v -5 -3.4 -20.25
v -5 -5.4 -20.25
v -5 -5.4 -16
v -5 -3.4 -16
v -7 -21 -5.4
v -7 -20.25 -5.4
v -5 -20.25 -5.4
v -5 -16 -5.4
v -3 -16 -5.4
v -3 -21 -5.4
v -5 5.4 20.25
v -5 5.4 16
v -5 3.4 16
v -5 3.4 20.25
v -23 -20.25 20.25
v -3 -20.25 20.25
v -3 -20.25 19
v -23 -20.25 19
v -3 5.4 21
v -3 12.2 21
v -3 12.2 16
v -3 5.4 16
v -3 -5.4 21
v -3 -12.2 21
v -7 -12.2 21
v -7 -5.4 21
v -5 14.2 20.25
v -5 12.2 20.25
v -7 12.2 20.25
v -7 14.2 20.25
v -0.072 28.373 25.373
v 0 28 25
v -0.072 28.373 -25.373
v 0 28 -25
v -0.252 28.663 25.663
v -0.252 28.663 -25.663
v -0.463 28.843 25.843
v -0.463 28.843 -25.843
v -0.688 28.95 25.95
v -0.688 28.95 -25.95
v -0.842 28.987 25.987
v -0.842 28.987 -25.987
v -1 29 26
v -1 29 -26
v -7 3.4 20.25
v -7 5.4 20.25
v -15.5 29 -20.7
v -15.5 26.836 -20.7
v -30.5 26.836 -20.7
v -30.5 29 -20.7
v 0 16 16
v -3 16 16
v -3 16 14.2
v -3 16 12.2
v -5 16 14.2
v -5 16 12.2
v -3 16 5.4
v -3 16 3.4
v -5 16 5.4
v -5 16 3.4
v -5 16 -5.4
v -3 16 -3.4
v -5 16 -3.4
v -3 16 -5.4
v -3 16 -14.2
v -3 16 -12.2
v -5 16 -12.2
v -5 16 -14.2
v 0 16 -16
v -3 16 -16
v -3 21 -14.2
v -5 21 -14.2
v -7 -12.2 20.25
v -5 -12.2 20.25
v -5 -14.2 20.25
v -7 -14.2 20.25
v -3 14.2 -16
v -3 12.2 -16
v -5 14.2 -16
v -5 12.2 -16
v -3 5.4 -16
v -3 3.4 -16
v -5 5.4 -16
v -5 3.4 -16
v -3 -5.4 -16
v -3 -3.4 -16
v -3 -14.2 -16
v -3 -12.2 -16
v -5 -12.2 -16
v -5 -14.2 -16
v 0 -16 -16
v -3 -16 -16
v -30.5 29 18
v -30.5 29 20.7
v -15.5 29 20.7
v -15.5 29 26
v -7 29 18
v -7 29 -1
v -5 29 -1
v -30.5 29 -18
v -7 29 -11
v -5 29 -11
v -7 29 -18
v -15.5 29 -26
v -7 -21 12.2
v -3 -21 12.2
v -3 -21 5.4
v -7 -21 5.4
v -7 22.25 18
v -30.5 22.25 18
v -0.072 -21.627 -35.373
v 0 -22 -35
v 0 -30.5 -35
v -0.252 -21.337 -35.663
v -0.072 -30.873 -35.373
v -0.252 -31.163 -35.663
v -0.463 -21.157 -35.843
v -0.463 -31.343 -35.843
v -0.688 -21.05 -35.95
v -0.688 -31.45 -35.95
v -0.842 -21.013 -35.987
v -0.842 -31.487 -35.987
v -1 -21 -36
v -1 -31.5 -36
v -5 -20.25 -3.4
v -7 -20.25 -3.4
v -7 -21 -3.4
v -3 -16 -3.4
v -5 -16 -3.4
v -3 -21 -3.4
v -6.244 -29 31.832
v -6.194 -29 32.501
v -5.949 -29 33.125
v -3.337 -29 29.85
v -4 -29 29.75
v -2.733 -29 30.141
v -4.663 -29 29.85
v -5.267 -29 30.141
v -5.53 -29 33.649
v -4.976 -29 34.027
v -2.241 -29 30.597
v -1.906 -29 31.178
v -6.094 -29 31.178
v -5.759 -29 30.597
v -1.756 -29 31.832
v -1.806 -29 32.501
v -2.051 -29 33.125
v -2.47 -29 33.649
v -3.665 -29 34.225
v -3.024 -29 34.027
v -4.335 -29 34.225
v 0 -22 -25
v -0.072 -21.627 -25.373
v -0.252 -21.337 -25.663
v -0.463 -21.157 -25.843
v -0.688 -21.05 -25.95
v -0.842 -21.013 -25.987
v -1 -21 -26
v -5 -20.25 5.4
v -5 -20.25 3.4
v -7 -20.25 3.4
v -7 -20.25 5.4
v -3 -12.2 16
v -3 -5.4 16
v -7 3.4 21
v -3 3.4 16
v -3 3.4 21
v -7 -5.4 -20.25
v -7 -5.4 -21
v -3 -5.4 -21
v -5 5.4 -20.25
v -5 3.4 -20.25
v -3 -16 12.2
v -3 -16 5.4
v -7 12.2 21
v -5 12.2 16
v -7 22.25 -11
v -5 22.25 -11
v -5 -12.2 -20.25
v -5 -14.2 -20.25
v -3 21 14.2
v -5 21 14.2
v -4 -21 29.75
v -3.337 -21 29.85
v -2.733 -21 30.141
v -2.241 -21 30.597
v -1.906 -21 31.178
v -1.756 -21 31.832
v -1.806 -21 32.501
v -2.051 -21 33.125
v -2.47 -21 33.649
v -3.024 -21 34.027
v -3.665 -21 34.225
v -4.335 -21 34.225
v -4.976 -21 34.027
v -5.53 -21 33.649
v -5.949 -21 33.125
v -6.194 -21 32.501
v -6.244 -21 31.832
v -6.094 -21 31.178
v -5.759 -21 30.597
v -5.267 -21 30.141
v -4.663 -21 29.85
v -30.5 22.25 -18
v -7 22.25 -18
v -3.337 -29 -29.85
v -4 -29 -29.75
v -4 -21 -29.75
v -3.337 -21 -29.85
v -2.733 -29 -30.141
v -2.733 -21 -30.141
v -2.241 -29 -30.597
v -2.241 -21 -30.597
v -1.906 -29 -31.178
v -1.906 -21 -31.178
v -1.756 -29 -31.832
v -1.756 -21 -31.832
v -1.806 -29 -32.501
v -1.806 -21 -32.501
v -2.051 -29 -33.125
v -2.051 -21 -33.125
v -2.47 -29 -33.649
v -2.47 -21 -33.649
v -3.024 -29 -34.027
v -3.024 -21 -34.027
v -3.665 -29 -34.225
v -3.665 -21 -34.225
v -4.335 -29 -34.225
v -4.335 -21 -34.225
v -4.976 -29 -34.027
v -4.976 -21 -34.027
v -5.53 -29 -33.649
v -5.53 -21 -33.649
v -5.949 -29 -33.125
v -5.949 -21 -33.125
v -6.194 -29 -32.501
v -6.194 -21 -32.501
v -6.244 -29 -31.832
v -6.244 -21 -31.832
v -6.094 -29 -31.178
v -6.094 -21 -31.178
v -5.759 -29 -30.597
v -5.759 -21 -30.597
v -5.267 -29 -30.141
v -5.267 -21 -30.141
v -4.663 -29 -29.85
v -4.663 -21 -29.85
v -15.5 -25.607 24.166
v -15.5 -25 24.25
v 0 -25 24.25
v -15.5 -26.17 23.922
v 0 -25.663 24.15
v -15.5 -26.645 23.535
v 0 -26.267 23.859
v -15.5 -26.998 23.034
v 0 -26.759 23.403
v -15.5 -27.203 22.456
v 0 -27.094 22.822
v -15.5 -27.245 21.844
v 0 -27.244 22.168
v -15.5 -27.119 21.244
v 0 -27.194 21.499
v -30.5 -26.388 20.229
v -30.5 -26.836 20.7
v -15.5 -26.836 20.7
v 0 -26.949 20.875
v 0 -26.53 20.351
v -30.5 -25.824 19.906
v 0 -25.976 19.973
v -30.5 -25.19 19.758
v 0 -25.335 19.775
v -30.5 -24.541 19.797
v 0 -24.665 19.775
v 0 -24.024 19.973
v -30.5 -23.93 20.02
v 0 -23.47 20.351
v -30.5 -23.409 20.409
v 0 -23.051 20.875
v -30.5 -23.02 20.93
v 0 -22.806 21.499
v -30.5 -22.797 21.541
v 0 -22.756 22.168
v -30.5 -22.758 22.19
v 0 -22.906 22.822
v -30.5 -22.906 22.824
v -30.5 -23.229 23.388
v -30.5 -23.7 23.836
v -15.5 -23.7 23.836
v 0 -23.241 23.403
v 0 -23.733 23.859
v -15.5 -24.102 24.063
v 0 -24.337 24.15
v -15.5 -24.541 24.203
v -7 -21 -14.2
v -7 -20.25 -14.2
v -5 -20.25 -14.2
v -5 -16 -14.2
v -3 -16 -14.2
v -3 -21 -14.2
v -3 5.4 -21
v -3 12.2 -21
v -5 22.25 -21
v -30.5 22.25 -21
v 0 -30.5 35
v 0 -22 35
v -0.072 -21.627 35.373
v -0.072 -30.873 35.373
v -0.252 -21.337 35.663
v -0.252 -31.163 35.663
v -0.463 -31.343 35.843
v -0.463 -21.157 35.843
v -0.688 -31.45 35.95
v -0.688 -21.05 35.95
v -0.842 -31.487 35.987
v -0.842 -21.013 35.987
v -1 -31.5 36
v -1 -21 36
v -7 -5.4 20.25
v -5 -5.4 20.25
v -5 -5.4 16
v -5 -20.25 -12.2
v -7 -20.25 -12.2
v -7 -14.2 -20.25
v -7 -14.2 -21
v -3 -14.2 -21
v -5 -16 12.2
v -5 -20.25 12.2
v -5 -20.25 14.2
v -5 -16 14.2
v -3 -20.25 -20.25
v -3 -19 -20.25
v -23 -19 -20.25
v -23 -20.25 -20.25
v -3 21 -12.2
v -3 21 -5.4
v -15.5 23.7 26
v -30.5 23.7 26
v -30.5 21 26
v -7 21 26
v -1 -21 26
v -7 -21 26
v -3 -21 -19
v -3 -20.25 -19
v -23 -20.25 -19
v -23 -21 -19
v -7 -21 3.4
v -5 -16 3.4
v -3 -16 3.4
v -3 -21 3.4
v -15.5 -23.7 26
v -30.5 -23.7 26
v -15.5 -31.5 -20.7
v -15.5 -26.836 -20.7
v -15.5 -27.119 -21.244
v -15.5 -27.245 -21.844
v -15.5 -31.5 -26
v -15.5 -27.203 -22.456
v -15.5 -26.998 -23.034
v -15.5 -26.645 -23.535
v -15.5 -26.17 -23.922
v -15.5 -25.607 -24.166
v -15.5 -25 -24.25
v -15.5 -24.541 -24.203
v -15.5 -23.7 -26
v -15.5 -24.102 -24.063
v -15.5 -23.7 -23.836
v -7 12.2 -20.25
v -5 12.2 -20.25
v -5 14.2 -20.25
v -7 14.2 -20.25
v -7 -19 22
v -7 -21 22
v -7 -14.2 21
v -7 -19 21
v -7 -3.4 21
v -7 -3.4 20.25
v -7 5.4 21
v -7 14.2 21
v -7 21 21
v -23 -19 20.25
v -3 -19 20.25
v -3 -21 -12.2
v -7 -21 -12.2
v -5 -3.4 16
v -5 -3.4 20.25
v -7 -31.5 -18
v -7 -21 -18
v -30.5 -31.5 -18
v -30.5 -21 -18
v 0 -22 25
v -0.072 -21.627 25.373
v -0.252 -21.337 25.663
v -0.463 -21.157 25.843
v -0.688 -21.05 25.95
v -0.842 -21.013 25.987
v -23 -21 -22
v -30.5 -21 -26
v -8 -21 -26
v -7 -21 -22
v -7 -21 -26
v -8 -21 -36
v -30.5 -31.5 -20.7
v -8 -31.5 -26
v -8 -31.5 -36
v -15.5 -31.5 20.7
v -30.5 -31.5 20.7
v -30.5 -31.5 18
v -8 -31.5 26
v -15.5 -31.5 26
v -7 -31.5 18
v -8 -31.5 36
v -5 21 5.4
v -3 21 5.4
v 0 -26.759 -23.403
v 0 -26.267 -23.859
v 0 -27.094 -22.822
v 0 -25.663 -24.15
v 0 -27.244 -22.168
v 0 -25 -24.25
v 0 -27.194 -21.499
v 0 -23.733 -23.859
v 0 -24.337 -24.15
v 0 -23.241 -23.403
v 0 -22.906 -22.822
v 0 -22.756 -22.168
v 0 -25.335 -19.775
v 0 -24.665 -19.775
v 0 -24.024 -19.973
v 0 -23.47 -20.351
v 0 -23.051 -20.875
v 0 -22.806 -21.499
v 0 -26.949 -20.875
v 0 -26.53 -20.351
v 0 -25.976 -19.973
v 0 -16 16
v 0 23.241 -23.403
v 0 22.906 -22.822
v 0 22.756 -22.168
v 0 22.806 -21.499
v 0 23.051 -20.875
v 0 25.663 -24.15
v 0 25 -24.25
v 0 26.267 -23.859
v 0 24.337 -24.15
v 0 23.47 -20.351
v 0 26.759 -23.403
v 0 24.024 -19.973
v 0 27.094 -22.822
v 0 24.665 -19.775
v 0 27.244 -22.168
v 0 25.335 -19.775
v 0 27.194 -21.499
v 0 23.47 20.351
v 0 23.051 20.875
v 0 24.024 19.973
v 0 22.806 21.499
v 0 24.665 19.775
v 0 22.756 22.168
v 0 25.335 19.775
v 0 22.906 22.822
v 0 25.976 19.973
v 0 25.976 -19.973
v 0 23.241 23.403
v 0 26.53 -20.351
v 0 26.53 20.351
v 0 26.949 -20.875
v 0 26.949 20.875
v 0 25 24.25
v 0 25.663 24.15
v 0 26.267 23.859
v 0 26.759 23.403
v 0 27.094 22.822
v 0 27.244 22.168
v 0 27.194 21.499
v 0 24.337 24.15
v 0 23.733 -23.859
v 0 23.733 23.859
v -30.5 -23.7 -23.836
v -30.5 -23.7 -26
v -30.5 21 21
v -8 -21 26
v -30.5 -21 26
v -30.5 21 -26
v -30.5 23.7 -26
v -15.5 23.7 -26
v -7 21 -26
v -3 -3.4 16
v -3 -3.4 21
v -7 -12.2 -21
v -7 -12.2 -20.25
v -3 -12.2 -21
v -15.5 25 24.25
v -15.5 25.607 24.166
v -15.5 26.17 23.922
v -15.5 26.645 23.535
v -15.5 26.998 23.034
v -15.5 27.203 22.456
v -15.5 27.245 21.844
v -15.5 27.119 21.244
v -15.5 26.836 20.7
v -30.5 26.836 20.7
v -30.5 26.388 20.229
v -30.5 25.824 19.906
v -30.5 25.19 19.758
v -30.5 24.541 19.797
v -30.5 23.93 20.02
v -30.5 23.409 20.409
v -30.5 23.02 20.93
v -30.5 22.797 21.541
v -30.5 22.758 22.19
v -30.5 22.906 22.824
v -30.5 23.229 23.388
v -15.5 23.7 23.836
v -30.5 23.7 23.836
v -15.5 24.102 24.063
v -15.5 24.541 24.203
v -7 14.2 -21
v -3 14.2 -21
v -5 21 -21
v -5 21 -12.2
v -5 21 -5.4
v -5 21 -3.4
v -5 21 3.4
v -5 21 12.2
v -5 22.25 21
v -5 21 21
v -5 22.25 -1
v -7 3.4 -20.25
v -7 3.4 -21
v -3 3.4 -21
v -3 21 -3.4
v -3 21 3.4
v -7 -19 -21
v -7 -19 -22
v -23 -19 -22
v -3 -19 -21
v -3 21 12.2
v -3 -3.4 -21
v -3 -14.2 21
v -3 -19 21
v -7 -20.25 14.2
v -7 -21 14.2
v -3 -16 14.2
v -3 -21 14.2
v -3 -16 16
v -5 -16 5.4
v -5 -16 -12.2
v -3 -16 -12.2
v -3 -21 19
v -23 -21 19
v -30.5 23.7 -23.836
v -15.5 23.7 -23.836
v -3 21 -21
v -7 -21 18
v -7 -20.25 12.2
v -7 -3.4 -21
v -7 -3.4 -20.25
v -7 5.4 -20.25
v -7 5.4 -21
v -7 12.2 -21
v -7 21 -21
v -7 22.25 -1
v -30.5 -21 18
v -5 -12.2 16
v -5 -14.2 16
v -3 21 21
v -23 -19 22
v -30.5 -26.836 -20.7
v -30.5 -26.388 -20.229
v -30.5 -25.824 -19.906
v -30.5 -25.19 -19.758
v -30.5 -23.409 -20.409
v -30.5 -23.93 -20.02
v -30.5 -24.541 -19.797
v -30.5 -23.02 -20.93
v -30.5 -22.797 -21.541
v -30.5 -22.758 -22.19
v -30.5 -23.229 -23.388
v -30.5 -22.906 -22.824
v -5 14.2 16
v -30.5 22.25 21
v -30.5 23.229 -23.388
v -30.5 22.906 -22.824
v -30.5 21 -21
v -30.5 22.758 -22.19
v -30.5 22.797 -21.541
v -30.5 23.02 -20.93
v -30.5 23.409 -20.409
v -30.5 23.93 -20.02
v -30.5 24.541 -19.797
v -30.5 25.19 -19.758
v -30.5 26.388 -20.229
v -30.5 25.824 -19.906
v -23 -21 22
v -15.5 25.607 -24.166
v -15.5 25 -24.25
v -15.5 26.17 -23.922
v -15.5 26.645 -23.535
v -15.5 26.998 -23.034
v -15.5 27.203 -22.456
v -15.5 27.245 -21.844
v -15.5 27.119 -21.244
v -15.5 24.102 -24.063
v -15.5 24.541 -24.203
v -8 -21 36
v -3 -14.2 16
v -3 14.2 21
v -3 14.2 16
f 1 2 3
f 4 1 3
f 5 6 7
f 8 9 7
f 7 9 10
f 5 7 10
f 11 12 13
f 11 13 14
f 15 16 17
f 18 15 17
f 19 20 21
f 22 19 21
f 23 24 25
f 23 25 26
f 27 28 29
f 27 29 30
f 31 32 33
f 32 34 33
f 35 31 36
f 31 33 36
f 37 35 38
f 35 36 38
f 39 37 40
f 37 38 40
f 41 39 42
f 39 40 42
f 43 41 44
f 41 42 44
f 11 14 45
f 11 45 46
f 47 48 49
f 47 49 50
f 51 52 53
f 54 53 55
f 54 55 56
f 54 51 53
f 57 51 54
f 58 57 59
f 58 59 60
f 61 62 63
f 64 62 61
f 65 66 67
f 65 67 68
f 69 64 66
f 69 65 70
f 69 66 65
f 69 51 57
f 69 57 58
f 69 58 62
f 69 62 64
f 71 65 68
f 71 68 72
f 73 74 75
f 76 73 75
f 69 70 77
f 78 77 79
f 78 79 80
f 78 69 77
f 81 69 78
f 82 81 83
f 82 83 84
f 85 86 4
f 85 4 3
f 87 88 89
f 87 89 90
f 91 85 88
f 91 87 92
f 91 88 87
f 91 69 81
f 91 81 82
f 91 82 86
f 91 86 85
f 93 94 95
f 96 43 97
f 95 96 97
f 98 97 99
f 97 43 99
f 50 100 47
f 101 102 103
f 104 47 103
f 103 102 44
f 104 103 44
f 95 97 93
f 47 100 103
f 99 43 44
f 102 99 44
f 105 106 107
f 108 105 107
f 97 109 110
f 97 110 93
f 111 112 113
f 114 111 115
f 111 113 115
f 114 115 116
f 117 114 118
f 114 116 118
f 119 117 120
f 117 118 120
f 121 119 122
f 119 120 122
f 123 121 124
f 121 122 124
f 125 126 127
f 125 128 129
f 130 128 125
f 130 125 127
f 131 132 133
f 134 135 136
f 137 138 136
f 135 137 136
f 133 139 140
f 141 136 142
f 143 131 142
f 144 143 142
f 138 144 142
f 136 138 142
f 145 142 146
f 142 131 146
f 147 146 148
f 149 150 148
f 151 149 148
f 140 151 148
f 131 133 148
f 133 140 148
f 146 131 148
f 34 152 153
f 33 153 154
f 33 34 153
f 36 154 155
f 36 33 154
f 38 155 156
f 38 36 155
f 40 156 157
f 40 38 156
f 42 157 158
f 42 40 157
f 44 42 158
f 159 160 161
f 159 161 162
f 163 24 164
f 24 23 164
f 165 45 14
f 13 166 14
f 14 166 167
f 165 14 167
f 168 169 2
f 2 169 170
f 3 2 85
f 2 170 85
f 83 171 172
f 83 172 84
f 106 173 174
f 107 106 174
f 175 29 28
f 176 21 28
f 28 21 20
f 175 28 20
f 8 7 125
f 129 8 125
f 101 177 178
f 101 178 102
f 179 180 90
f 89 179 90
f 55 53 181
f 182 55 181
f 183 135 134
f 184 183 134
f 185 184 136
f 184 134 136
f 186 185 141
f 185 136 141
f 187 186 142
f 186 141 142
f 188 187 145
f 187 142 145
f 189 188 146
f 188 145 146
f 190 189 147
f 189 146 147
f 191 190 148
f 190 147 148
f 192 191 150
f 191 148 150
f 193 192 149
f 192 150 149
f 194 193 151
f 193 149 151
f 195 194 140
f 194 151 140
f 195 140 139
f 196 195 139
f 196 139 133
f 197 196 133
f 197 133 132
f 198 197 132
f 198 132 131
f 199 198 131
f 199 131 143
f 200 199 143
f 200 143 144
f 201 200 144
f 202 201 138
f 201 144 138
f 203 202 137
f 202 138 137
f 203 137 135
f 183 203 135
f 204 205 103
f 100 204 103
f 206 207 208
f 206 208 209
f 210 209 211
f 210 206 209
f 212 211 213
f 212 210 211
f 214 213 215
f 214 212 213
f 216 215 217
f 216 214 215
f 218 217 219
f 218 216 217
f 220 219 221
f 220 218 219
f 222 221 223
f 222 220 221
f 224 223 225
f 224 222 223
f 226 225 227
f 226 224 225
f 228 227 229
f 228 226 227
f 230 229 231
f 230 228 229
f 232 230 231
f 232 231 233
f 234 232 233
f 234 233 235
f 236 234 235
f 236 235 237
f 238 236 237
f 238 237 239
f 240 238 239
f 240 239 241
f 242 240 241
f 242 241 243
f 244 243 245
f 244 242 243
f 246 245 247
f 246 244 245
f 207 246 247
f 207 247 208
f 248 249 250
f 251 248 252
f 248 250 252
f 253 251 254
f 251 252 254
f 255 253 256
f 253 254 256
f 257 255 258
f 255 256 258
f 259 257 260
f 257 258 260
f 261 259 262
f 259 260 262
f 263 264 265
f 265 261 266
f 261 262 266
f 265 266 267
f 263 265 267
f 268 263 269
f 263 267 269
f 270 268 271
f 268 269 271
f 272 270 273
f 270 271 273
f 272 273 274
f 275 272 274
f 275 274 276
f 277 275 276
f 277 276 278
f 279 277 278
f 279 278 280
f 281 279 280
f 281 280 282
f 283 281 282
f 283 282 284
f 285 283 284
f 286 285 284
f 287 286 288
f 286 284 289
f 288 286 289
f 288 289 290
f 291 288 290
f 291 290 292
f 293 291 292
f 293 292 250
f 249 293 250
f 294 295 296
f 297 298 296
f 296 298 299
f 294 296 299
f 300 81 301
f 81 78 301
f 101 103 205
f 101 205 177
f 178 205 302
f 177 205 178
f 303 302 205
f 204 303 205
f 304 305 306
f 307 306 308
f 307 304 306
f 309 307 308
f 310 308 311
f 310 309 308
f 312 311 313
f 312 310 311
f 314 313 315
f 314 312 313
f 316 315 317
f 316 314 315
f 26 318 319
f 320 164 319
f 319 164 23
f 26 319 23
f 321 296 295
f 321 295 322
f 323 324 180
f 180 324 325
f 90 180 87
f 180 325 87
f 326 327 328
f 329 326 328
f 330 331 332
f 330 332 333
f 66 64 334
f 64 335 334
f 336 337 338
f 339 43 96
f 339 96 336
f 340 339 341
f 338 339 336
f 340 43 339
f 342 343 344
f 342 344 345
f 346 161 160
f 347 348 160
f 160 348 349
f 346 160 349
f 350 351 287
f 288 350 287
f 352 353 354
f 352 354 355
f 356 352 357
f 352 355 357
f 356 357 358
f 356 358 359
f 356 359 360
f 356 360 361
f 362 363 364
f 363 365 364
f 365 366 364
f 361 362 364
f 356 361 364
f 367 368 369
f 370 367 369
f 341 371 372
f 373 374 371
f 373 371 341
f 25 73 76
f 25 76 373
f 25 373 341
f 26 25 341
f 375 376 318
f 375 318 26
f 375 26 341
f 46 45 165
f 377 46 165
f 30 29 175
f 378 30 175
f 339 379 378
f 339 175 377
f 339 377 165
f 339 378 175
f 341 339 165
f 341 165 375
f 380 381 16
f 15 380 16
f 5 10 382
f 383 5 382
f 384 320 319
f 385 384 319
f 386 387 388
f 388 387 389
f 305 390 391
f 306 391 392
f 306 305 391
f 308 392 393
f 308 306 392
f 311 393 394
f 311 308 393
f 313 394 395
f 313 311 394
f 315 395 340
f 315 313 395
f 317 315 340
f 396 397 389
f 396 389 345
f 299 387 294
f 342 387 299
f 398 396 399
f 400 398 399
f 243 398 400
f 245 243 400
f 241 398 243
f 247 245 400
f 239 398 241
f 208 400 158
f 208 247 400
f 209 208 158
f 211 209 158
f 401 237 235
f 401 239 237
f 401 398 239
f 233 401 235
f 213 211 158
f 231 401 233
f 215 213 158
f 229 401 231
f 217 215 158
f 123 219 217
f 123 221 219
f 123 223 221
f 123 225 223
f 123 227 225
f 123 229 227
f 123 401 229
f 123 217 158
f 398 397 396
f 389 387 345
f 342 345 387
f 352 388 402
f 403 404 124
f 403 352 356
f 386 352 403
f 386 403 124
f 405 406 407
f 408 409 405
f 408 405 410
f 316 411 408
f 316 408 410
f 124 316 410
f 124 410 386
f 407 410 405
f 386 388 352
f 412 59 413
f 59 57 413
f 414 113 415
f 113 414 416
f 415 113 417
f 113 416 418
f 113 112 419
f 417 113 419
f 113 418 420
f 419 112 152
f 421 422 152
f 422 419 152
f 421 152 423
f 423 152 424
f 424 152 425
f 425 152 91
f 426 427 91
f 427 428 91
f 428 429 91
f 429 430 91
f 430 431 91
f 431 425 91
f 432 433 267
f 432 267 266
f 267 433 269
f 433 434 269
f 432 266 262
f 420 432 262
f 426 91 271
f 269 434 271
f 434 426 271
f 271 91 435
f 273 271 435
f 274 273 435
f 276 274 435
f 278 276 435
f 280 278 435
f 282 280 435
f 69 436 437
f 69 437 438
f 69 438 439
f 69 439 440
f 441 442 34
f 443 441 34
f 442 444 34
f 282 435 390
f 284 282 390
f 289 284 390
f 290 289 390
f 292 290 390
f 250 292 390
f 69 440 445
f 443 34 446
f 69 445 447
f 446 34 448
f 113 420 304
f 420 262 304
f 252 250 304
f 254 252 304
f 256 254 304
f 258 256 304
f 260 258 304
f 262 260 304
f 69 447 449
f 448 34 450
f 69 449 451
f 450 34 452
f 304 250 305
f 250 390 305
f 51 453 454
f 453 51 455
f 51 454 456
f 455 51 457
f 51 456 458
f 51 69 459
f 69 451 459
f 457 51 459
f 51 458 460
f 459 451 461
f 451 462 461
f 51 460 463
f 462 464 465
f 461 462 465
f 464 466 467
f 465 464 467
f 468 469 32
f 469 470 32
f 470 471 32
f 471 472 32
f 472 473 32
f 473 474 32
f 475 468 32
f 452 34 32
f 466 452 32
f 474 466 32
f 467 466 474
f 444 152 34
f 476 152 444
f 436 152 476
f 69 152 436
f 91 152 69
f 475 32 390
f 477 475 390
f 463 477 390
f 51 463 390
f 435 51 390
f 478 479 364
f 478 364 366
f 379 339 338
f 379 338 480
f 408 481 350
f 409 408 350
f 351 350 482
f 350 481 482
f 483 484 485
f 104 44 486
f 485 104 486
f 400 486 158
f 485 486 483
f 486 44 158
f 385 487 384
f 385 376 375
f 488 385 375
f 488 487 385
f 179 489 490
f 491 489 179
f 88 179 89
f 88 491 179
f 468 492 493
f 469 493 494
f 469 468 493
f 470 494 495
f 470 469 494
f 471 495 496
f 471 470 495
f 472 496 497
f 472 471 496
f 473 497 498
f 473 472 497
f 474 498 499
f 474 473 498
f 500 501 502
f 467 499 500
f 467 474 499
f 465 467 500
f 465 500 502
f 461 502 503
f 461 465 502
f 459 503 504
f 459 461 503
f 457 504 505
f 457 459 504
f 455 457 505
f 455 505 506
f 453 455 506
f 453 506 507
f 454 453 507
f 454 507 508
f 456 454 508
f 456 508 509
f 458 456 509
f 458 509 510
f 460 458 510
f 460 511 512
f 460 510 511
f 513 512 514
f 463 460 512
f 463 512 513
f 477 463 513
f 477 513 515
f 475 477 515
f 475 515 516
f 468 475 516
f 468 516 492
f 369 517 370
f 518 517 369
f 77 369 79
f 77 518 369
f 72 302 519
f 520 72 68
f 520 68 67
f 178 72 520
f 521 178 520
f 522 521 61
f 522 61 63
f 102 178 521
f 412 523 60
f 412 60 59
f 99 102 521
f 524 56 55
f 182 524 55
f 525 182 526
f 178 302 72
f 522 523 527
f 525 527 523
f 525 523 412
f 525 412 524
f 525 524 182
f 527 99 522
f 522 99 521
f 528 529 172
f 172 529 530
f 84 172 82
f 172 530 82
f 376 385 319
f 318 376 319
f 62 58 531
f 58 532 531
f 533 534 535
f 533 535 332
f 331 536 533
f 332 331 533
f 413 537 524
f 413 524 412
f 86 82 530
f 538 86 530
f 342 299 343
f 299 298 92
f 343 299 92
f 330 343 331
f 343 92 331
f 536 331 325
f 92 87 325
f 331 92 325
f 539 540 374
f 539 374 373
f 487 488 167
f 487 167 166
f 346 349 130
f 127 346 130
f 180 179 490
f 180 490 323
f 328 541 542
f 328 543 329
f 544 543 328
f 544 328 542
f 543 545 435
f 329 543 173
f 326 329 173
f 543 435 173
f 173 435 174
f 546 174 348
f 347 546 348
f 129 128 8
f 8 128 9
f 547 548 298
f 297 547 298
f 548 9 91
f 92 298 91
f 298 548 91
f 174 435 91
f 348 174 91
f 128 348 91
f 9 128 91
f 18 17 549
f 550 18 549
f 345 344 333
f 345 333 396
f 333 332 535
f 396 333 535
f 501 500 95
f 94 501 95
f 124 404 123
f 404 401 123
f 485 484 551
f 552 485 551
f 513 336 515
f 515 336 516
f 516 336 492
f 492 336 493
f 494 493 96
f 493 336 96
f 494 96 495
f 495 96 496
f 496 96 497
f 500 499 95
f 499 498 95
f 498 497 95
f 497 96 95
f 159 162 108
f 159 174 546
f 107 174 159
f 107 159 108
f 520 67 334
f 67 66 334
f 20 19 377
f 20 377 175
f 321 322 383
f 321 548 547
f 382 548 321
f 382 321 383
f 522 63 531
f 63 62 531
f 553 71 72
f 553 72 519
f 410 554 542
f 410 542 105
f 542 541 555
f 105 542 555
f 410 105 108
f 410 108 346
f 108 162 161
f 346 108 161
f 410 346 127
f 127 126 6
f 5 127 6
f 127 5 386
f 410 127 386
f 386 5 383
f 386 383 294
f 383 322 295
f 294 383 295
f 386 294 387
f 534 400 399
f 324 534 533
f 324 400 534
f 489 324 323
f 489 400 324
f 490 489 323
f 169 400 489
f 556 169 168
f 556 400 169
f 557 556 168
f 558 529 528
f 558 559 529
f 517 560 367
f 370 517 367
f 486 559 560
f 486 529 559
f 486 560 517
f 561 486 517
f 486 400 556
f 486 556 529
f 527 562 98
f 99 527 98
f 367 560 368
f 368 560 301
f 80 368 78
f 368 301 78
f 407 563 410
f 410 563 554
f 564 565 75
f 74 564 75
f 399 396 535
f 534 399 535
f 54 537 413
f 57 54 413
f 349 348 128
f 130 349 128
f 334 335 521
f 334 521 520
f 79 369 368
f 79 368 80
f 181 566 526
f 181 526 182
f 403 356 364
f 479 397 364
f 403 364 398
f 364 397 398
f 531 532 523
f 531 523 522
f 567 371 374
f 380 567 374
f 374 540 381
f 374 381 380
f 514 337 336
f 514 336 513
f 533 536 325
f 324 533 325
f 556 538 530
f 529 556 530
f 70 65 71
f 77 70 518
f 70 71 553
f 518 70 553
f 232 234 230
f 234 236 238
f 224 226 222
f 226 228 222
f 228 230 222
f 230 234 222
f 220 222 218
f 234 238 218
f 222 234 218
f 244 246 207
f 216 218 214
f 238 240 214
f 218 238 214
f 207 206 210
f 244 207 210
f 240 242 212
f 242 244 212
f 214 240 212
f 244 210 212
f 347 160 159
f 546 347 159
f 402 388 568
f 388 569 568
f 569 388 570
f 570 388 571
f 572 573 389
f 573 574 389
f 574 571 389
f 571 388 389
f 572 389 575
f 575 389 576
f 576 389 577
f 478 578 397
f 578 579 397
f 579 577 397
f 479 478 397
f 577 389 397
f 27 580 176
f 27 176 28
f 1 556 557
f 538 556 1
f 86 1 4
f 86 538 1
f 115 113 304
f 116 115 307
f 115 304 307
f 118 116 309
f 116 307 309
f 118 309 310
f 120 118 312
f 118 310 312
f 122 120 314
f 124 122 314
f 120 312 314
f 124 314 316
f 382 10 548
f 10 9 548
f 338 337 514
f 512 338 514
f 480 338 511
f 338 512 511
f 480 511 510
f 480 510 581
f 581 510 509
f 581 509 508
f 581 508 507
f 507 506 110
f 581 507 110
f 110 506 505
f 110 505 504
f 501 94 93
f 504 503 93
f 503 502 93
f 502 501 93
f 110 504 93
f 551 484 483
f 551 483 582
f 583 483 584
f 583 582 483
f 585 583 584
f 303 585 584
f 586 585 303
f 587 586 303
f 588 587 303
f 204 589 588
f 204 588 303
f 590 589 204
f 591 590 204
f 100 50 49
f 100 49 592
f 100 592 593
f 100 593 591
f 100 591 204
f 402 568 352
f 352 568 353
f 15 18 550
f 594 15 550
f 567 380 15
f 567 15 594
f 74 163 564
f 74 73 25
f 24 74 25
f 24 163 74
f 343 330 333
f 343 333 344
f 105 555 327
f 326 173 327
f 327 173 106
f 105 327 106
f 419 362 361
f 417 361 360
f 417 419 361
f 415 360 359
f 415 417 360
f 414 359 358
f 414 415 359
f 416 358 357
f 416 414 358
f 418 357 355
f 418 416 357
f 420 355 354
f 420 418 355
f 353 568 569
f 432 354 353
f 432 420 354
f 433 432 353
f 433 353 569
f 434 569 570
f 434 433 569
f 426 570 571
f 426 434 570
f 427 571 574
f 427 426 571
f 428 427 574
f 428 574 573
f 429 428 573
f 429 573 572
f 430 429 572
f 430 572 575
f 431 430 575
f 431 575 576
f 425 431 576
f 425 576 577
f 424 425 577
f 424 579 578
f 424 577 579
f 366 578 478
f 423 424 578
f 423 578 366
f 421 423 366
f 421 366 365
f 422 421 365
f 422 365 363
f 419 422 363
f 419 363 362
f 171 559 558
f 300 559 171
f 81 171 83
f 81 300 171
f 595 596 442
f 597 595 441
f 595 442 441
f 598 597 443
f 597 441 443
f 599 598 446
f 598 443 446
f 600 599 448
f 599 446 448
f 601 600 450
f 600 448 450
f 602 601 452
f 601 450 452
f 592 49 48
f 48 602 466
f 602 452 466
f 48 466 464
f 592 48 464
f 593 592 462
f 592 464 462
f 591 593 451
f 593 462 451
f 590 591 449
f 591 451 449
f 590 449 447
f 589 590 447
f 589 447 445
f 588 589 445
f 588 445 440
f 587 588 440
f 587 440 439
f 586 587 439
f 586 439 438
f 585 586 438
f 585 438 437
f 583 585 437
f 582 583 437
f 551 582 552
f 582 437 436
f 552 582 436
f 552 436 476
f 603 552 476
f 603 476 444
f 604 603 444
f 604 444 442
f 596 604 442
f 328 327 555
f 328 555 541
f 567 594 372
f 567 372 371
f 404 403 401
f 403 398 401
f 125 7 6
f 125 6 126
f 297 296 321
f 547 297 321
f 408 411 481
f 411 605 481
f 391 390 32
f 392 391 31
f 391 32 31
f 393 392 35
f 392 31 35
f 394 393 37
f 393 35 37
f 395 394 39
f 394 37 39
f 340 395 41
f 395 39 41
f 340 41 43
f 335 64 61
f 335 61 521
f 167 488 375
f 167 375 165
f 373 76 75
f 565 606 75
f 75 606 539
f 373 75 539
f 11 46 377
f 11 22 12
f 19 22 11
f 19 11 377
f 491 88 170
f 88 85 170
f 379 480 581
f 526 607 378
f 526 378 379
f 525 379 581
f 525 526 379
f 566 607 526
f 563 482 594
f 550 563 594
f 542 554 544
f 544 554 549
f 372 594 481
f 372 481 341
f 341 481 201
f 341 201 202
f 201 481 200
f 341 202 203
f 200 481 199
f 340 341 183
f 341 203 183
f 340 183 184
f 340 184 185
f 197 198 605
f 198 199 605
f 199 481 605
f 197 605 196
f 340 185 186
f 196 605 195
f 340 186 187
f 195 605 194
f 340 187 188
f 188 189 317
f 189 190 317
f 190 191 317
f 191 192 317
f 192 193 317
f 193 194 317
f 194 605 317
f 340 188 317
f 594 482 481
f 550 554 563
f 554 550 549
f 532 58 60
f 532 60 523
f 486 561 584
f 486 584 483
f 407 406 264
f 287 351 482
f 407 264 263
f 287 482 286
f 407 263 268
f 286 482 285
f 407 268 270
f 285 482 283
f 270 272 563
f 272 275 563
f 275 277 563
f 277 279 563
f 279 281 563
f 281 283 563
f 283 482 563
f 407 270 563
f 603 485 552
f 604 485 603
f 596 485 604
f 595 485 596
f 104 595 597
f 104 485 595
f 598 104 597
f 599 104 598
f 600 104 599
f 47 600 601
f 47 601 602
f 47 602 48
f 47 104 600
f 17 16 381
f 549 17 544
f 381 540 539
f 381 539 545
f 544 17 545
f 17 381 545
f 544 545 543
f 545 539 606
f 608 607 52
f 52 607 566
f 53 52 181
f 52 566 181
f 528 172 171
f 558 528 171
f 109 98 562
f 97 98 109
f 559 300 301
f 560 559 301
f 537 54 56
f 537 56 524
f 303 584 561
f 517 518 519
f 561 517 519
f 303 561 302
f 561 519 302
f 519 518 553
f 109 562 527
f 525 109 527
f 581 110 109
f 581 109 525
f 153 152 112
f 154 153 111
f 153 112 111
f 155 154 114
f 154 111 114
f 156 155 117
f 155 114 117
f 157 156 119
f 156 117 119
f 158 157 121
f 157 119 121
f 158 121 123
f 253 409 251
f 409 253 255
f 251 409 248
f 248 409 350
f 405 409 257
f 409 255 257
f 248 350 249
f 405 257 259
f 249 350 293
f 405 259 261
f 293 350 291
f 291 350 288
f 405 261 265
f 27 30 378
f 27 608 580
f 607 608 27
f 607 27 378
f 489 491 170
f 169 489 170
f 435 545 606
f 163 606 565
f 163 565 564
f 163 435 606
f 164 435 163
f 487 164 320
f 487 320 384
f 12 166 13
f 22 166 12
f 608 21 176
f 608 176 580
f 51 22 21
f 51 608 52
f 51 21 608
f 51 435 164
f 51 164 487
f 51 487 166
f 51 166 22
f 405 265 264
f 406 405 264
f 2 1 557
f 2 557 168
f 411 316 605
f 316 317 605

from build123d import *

# Parameters (mm, degrees)
SKETCH1_W               = 52
SKETCH1_H               = 58
SKETCH1_W_2             = 32
SKETCH1_H_2             = 32
BOSS_EXTRUDE1_DEPTH     = 3
SKETCH2_W               = 52
SKETCH2_H               = 58
SKETCH2_W_2             = 42
SKETCH2_H_2             = 42
BOSS_EXTRUDE2_DEPTH     = 4
SKETCH3_W               = 8
SKETCH3_H               = 8
BOSS_EXTRUDE3_DEPTH     = 23.5
SKETCH4_R               = 2.25
CUT_EXTRUDE1_DEPTH      = 50.469687689
SKETCH5_W               = 5.3
SKETCH5_H               = 5.3
CUT_EXTRUDE2_DEPTH      = 15
MIRROR2_COPY_1_SKETCH_W = 8
MIRROR2_COPY_1_SKETCH_H = 8
MIRROR2_COPY_1_DEPTH    = 23.5
MIRROR2_COPY_2_SKETCH_R = 2.25
MIRROR2_COPY_2_DEPTH    = 50.469687689
MIRROR2_COPY_3_SKETCH_W = 5.3
MIRROR2_COPY_3_SKETCH_H = 5.3
MIRROR2_COPY_3_DEPTH    = 15
SKETCH6_W               = 2
SKETCH6_H               = 0.75
SKETCH6_W_2             = 0.75
SKETCH6_H_2             = 2
BOSS_EXTRUDE4_DEPTH     = 4
SKETCH7_W               = 4.25
SKETCH7_H               = 2
SKETCH7_W_2             = 2
SKETCH7_H_2             = 4.25
BOSS_EXTRUDE5_DEPTH     = 2
CUT_EXTRUDE3_REACH      = 51.47
SKETCH8_W               = 42
SKETCH8_H               = 2
BOSS_EXTRUDE6_DEPTH     = 20
SKETCH10_W              = 8
SKETCH10_H              = 10
SKETCH10_R              = 2.25
BOSS_EXTRUDE7_DEPTH     = 8
SKETCH11_W              = 10
SKETCH11_H              = 8
CUT_EXTRUDE4_DEPTH      = 2
BOSS_EXTRUDE8_DEPTH     = 2.5
FILLET1_R               = 1


with BuildPart() as part:
    # Sketch1 → Boss-Extrude1 (new body)
    with BuildSketch(Plane(origin=(0, 0, 0), x_dir=(0, 0, -1), z_dir=(1, 0, 0))):
        Rectangle(SKETCH1_W, SKETCH1_H)
        Rectangle(SKETCH1_W_2, SKETCH1_H_2, mode=Mode.SUBTRACT)
    extrude(amount=-BOSS_EXTRUDE1_DEPTH)

    # Sketch2 → Boss-Extrude2 (add)
    with BuildSketch(Plane.ZY.offset(3)):
        Rectangle(SKETCH2_W, SKETCH2_H)
        Rectangle(SKETCH2_W_2, SKETCH2_H_2, mode=Mode.SUBTRACT)
    extrude(amount=BOSS_EXTRUDE2_DEPTH)

    # Sketch3 → Boss-Extrude3 (add)
    with BuildSketch(Plane.ZY.offset(7)):
        with Locations((-22, 25)):
            Rectangle(SKETCH3_W, SKETCH3_H)
    boss_extrude3 = extrude(amount=BOSS_EXTRUDE3_DEPTH)

    # Sketch4 → Cut-Extrude1 (cut, through all)
    with BuildSketch(Plane(origin=(0, 0, 0), x_dir=(0, 0, -1), z_dir=(1, 0, 0))):
        with Locations((22, 25)):
            Circle(SKETCH4_R)
    cut_extrude1 = extrude(amount=-CUT_EXTRUDE1_DEPTH, mode=Mode.SUBTRACT)

    # Sketch5 → Cut-Extrude2 (cut)
    with BuildSketch(Plane.ZY.offset(30.5)):
        with Locations((-23.35, 26.35)):
            Rectangle(SKETCH5_W, SKETCH5_H)
    cut_extrude2 = extrude(amount=-CUT_EXTRUDE2_DEPTH, mode=Mode.SUBTRACT)

    # Mirror1: Boss-Extrude3, Cut-Extrude1, Cut-Extrude2 across plane
    add(boss_extrude3.mirror(Plane.ZX))
    add(cut_extrude1.mirror(Plane.ZX), mode=Mode.SUBTRACT)
    add(cut_extrude2.mirror(Plane.ZX), mode=Mode.SUBTRACT)

    # Mirror2: Boss-Extrude3, Cut-Extrude1, Cut-Extrude2 across plane
    add(boss_extrude3.mirror(Plane.XY))
    add(cut_extrude1.mirror(Plane.XY), mode=Mode.SUBTRACT)
    add(cut_extrude2.mirror(Plane.XY), mode=Mode.SUBTRACT)

    # Mirror2 copy 1 sketch → Mirror2 copy 1 (add)
    with BuildSketch(Plane(origin=(-7, 0, 0), x_dir=(0, 0, -1), z_dir=(-1, 0, 0))):
        with Locations((-22, 25)):
            Rectangle(MIRROR2_COPY_1_SKETCH_W, MIRROR2_COPY_1_SKETCH_H)
    extrude(amount=MIRROR2_COPY_1_DEPTH)

    # Mirror2 copy 2 sketch → Mirror2 copy 2 (cut, through all)
    with BuildSketch(Plane(origin=(0, 0, 0), x_dir=(0, 0, 1), z_dir=(1, 0, 0))):
        with Locations((22, 25)):
            Circle(MIRROR2_COPY_2_SKETCH_R)
    extrude(amount=-MIRROR2_COPY_2_DEPTH, mode=Mode.SUBTRACT)

    # Mirror2 copy 3 sketch → Mirror2 copy 3 (cut)
    with BuildSketch(Plane(origin=(-30.5, 0, 0), x_dir=(0, 0, -1), z_dir=(-1, 0, 0))):
        with Locations((-23.35, 26.35)):
            Rectangle(MIRROR2_COPY_3_SKETCH_W, MIRROR2_COPY_3_SKETCH_H)
    extrude(amount=-MIRROR2_COPY_3_DEPTH, mode=Mode.SUBTRACT)

    # Sketch6 → Boss-Extrude4 (add)
    with BuildSketch(Plane.ZY.offset(3)):
        with Locations((-13.2, 20.625)):
            Rectangle(SKETCH6_W, SKETCH6_H)
        with Locations((-4.4, 20.625)):
            Rectangle(SKETCH6_W, SKETCH6_H)
        with Locations((4.4, 20.625)):
            Rectangle(SKETCH6_W, SKETCH6_H)
        with Locations((13.2, 20.625)):
            Rectangle(SKETCH6_W, SKETCH6_H)
        with Locations((20.625, 13.2)):
            Rectangle(SKETCH6_W_2, SKETCH6_H_2)
        with Locations((20.625, 4.4)):
            Rectangle(SKETCH6_W_2, SKETCH6_H_2)
        with Locations((-20.625, 13.2)):
            Rectangle(SKETCH6_W_2, SKETCH6_H_2)
        with Locations((-20.625, 4.4)):
            Rectangle(SKETCH6_W_2, SKETCH6_H_2)
    boss_extrude4 = extrude(amount=BOSS_EXTRUDE4_DEPTH)

    # Sketch7 → Boss-Extrude5 (add)
    with BuildSketch(Plane.ZY.offset(3)):
        with Locations((-18.125, 4.4)):
            Rectangle(SKETCH7_W, SKETCH7_H)
        with Locations((-18.125, 13.2)):
            Rectangle(SKETCH7_W, SKETCH7_H)
        with Locations((-13.2, 18.125)):
            Rectangle(SKETCH7_W_2, SKETCH7_H_2)
        with Locations((-4.4, 18.125)):
            Rectangle(SKETCH7_W_2, SKETCH7_H_2)
        with Locations((4.4, 18.125)):
            Rectangle(SKETCH7_W_2, SKETCH7_H_2)
        with Locations((13.2, 18.125)):
            Rectangle(SKETCH7_W_2, SKETCH7_H_2)
        with Locations((18.125, 13.2)):
            Rectangle(SKETCH7_W, SKETCH7_H)
        with Locations((18.125, 4.4)):
            Rectangle(SKETCH7_W, SKETCH7_H)
    boss_extrude5 = extrude(amount=BOSS_EXTRUDE5_DEPTH)

    # Mirror3: Boss-Extrude4, Boss-Extrude5 across plane
    add(boss_extrude4.mirror(Plane.ZX))
    add(boss_extrude5.mirror(Plane.ZX))

    # Cut-Extrude3: up to this face of the body (flat: up to its plane)
    cut_extrude3_end = Plane(part.part.faces().sort_by_distance((-5, 18.125, -13.2))[0])
    # Sketch8 → Cut-Extrude3 (cut, up to the picked face)
    with BuildSketch(Plane.ZY.offset(30.5), mode=Mode.PRIVATE) as cut_extrude3_sk1:
        with Locations((0, 21.25)):
            Rectangle(SKETCH8_W, SKETCH8_H)
    cut_extrude3_tool1 = split(extrude(cut_extrude3_sk1.sketch, amount=-CUT_EXTRUDE3_REACH, mode=Mode.PRIVATE), bisect_by=cut_extrude3_end, keep=Keep.BOTH, mode=Mode.PRIVATE)
    add(cut_extrude3_tool1.solids().sort_by(Axis((-30.5, 21.25, 0), (1, 0, 0)))[0], mode=Mode.SUBTRACT)

    # Sketch9 → Boss-Extrude6 (add)
    with BuildSketch(Plane.ZY.offset(3)):
        Polygon((-22, -21), (-22, -19), (-20.25, -19), (-20.25, -20.25), (-19, -20.25), (-19, -21), align=None)
    boss_extrude6 = extrude(amount=BOSS_EXTRUDE6_DEPTH)

    # Mirror4: Boss-Extrude6 across plane
    add(boss_extrude6.mirror(Plane.XY))

    # Sketch10 → Boss-Extrude7 (add)
    with BuildSketch(Plane.XZ.offset(29)):
        with Locations((-4, 31)):
            Rectangle(SKETCH10_W, SKETCH10_H)
        with Locations(Location((-4, 32, 0), (0, 0, 270))):
            Circle(SKETCH10_R, mode=Mode.SUBTRACT)
    boss_extrude7 = extrude(amount=-BOSS_EXTRUDE7_DEPTH)

    # Mirror5: Boss-Extrude7 across plane
    add(boss_extrude7.mirror(Plane.XY))

    # Sketch11 → Cut-Extrude4 (cut)
    with BuildSketch(Plane.ZY.offset(7)):
        with Locations((-6, 26.25)):
            Rectangle(SKETCH11_W, SKETCH11_H)
    extrude(amount=-CUT_EXTRUDE4_DEPTH, mode=Mode.SUBTRACT)

    # Sketch12 → Boss-Extrude8 (add)
    with BuildSketch(Plane.XZ.offset(29)):
        Polygon((-15.5, 20.7), (-30.5, 20.7), (-30.5, 18), (-7, 18), (-7, -18), (-30.5, -18), (-30.5, -20.7), (-15.5, -20.7), (-15.5, -26), (-8, -26), (-8, -36), (0, -36), (0, 36), (-8, 36), (-8, 26), (-15.5, 26), align=None)
    extrude(amount=BOSS_EXTRUDE8_DEPTH)

    # Fillet1
    fillet1_edges = [part.edges().sort_by_distance(p)[0] for p in [
        (0, 29, 0),
        (0, 4, 26),
        (0, -21, 31),
        (0, -26.25, 36),
        (0, 4, -26),
        (0, -26.25, -36),
        (0, -21, -31),
        (0, -31.5, 0),
    ]]
    fillet(fillet1_edges, radius=FILLET1_R)


solid = part.part
